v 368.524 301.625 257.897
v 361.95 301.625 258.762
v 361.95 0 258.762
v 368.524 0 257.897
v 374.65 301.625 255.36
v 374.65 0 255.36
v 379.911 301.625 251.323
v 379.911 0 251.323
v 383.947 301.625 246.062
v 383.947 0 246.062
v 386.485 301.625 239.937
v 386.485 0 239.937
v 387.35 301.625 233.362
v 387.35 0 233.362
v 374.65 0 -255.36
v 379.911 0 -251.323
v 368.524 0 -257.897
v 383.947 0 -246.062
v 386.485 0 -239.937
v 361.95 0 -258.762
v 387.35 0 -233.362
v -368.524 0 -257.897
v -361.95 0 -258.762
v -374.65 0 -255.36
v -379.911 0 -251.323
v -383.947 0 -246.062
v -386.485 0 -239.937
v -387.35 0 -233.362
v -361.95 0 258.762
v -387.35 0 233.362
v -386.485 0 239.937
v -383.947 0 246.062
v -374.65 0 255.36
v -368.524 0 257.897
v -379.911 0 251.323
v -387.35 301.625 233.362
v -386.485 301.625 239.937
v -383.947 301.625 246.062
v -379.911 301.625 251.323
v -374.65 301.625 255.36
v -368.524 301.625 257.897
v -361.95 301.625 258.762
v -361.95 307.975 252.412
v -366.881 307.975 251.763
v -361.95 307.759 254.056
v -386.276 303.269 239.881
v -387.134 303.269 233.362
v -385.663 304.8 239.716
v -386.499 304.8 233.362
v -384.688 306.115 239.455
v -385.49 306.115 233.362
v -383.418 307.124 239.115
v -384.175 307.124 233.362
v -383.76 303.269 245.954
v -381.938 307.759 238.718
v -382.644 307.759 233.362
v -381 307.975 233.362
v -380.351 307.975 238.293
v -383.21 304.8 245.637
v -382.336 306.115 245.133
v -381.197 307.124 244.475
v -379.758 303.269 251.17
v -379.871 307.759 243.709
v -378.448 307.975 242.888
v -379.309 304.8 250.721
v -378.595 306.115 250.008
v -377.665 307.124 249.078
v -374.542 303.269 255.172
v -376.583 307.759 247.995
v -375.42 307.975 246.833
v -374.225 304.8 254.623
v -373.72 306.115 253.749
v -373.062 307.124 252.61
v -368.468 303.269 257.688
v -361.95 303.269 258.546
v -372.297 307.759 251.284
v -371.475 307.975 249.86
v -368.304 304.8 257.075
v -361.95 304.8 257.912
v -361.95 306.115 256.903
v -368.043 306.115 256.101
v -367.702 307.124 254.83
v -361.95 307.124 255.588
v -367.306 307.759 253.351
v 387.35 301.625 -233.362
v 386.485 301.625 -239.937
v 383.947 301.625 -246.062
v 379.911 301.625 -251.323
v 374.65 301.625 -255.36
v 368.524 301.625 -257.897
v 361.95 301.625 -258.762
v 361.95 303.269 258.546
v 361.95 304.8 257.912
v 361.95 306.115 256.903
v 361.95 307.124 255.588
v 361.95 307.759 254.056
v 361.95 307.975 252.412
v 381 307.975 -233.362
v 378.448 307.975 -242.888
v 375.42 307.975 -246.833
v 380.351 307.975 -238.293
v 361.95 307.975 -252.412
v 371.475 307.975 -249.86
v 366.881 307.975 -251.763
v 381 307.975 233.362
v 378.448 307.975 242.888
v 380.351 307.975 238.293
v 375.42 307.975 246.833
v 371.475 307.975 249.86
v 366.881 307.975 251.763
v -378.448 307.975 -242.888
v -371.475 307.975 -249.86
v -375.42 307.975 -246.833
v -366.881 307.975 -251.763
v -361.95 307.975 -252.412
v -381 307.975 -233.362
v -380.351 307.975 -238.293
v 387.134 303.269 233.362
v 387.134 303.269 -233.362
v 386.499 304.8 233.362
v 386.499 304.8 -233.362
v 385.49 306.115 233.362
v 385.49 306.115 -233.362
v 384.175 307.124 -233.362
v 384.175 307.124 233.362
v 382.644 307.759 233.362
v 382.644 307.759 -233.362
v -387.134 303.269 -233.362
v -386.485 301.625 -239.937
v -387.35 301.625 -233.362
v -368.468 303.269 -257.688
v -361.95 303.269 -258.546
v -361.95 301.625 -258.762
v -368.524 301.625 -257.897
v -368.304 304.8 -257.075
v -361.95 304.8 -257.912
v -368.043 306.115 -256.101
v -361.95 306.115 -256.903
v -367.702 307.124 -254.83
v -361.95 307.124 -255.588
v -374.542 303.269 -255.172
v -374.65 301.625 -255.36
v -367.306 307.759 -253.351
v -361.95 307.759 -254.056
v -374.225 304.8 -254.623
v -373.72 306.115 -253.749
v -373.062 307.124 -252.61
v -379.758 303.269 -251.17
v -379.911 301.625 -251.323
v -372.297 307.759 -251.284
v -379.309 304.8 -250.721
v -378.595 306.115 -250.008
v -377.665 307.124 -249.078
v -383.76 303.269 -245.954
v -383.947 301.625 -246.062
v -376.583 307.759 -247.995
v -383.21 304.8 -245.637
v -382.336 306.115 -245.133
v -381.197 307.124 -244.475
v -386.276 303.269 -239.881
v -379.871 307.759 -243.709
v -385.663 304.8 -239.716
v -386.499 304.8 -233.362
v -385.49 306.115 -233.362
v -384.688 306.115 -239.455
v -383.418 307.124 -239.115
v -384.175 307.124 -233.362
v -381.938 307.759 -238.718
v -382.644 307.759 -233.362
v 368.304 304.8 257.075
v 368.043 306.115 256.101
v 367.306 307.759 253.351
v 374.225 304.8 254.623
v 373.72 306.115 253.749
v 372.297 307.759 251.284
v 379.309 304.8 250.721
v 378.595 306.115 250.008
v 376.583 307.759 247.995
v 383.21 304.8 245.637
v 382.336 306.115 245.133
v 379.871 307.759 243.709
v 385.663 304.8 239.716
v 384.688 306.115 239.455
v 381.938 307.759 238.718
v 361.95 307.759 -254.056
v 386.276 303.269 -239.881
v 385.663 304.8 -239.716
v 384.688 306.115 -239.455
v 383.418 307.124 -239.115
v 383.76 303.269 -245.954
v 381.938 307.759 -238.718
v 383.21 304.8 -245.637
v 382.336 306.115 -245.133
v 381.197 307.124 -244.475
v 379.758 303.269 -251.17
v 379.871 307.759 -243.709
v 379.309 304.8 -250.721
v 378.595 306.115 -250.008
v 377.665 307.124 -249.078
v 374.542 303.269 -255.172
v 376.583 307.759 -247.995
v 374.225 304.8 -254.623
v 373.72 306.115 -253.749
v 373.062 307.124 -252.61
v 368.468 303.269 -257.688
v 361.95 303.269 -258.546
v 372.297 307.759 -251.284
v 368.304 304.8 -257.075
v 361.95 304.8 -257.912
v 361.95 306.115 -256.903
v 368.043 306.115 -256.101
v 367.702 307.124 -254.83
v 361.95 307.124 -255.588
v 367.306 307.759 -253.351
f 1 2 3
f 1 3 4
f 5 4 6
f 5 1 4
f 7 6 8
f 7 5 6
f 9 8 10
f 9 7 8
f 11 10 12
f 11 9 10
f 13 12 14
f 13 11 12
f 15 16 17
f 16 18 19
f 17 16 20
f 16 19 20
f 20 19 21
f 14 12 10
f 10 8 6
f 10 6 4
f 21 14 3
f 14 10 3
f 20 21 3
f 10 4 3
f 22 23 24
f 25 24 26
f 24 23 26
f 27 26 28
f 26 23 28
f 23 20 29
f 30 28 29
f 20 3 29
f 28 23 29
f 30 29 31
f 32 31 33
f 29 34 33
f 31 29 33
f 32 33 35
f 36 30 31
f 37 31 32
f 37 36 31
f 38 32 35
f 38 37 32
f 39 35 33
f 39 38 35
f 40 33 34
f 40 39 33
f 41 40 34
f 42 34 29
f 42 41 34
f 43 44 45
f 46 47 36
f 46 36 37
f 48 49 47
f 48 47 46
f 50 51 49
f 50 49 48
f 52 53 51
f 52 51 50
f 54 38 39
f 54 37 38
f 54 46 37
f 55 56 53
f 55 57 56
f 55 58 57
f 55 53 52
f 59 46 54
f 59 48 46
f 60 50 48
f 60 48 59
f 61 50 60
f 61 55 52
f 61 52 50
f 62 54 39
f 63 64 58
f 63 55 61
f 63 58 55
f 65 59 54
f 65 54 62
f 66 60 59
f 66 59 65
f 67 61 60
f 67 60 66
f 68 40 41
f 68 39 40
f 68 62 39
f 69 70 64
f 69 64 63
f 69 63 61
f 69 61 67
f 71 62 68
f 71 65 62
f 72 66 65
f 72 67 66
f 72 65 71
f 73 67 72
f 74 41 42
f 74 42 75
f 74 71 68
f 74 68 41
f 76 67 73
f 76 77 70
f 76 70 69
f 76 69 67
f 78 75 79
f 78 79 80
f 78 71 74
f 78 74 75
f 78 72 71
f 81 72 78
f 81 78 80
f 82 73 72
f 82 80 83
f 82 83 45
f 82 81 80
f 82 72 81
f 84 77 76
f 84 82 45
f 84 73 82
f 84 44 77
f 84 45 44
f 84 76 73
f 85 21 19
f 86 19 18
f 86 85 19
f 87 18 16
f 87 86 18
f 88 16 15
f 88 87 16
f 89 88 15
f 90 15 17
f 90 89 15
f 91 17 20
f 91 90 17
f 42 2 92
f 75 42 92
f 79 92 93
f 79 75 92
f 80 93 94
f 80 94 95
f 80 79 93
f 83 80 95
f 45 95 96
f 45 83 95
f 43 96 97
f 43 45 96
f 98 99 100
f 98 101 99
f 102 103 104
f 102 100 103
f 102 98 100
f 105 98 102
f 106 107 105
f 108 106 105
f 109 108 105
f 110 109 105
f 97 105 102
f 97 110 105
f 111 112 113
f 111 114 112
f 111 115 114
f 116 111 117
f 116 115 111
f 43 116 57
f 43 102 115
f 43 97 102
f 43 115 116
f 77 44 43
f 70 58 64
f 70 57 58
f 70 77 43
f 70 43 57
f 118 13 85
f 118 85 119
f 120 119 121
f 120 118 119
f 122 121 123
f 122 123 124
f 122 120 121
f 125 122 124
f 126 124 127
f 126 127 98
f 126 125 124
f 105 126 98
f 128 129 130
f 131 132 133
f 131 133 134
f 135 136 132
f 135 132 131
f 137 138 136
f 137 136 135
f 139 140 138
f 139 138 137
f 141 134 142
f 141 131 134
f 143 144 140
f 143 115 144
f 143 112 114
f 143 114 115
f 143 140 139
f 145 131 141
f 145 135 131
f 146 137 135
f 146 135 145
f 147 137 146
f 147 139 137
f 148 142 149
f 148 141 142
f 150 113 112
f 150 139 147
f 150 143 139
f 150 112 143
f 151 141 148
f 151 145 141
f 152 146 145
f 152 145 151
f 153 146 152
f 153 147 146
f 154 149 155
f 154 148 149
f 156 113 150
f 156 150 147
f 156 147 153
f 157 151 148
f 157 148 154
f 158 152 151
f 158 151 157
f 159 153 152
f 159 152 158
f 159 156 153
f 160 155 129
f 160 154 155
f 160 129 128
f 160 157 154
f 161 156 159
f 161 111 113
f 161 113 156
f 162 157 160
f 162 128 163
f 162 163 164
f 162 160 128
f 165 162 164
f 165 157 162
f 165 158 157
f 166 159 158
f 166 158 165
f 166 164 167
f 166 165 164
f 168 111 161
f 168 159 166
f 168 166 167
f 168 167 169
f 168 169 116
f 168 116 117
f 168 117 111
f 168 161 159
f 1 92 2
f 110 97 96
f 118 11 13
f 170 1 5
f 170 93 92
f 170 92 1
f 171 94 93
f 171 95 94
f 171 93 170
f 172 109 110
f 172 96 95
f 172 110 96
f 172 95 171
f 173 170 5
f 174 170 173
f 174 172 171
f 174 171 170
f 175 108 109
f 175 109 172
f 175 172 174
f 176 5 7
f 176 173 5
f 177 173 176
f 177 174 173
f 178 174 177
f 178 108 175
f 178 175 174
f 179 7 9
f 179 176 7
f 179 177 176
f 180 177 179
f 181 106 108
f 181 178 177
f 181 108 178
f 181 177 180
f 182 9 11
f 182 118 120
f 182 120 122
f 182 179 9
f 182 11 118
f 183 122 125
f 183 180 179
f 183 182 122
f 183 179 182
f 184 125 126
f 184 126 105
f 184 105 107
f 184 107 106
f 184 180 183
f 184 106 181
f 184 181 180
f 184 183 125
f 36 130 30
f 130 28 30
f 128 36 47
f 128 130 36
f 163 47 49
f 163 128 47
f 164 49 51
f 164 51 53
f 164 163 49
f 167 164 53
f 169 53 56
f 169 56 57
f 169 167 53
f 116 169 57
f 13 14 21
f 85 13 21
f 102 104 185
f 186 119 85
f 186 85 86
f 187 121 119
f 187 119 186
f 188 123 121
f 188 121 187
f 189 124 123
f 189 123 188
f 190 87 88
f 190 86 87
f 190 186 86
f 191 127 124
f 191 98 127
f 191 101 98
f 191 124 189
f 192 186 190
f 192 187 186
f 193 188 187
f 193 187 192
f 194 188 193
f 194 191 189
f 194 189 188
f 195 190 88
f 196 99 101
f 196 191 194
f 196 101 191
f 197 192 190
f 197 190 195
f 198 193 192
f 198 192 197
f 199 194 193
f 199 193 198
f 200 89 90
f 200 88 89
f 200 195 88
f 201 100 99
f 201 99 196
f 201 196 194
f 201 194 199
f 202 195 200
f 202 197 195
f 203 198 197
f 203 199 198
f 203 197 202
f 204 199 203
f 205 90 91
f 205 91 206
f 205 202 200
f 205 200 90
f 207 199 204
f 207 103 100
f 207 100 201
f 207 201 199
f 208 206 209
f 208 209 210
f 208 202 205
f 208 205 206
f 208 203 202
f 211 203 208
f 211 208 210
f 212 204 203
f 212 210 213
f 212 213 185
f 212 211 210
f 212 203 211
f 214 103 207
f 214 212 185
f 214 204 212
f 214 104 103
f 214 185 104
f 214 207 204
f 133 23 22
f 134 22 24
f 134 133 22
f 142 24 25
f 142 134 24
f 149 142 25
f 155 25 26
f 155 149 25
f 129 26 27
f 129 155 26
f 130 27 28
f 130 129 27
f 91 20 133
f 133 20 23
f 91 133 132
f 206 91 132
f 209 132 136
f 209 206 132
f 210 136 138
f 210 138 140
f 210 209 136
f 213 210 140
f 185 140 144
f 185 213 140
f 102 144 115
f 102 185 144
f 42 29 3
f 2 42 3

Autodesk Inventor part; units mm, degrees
ref_plane "YZ Plane" through (0, 0, 0) normal (1, 0, 0) x (0, 1, 0)
sketch "Sketch1" plane through (0, 0, 0) normal (0, 1, 0) x (-1, 0, 0)
  line L0 (387.35, 258.7625) -> (-387.35, 258.7625)
  line L1 (-387.35, 258.7625) -> (-387.35, -258.7625)
  line L2 (-387.35, -258.7625) -> (387.35, -258.7625)
  line L3 (387.35, -258.7625) -> (387.35, 258.7625)
  line L4 (387.35, 258.7625) -> (-387.35, -258.7625) construction
  line L5 (-387.35, 258.7625) -> (387.35, -258.7625) construction
  point P0 (0, 0)
  dimension "d0" = 774.7
  dimension "d1" = 517.525
extrude "Extrusion1" add sketch "Sketch1" along normal blind 307.975
ref_plane "Work Plane1" through (0, 247.65, 0) normal (0, 1, 0) x (-1, 0, 0)
split_face "Split1"
ref_plane "Work Plane2" through (0, 177.8, 0) normal (0, 1, 0) x (-1, 0, 0)
split_face "Split2"
fillet "Fillet1" radius 25.4 4 edges at (-387.35, 153.9875, 258.7625) (387.35, 153.9875, 258.7625) (387.35, 153.9875, -258.7625) (-387.35, 153.9875, -258.7625)
fillet "Fillet2" radius 6.35 8 edges at (-379.9105, 307.975, -251.323) (-379.9105, 307.975, 251.323) (379.9105, 307.975, -251.323) (379.9105, 307.975, 251.323) (387.35, 307.975, 0) (0, 307.975, -258.7625) (-387.35, 307.975, 0) (0, 307.975, 258.7625)
properties part number "Pelican case" material "ABS Plastic"
